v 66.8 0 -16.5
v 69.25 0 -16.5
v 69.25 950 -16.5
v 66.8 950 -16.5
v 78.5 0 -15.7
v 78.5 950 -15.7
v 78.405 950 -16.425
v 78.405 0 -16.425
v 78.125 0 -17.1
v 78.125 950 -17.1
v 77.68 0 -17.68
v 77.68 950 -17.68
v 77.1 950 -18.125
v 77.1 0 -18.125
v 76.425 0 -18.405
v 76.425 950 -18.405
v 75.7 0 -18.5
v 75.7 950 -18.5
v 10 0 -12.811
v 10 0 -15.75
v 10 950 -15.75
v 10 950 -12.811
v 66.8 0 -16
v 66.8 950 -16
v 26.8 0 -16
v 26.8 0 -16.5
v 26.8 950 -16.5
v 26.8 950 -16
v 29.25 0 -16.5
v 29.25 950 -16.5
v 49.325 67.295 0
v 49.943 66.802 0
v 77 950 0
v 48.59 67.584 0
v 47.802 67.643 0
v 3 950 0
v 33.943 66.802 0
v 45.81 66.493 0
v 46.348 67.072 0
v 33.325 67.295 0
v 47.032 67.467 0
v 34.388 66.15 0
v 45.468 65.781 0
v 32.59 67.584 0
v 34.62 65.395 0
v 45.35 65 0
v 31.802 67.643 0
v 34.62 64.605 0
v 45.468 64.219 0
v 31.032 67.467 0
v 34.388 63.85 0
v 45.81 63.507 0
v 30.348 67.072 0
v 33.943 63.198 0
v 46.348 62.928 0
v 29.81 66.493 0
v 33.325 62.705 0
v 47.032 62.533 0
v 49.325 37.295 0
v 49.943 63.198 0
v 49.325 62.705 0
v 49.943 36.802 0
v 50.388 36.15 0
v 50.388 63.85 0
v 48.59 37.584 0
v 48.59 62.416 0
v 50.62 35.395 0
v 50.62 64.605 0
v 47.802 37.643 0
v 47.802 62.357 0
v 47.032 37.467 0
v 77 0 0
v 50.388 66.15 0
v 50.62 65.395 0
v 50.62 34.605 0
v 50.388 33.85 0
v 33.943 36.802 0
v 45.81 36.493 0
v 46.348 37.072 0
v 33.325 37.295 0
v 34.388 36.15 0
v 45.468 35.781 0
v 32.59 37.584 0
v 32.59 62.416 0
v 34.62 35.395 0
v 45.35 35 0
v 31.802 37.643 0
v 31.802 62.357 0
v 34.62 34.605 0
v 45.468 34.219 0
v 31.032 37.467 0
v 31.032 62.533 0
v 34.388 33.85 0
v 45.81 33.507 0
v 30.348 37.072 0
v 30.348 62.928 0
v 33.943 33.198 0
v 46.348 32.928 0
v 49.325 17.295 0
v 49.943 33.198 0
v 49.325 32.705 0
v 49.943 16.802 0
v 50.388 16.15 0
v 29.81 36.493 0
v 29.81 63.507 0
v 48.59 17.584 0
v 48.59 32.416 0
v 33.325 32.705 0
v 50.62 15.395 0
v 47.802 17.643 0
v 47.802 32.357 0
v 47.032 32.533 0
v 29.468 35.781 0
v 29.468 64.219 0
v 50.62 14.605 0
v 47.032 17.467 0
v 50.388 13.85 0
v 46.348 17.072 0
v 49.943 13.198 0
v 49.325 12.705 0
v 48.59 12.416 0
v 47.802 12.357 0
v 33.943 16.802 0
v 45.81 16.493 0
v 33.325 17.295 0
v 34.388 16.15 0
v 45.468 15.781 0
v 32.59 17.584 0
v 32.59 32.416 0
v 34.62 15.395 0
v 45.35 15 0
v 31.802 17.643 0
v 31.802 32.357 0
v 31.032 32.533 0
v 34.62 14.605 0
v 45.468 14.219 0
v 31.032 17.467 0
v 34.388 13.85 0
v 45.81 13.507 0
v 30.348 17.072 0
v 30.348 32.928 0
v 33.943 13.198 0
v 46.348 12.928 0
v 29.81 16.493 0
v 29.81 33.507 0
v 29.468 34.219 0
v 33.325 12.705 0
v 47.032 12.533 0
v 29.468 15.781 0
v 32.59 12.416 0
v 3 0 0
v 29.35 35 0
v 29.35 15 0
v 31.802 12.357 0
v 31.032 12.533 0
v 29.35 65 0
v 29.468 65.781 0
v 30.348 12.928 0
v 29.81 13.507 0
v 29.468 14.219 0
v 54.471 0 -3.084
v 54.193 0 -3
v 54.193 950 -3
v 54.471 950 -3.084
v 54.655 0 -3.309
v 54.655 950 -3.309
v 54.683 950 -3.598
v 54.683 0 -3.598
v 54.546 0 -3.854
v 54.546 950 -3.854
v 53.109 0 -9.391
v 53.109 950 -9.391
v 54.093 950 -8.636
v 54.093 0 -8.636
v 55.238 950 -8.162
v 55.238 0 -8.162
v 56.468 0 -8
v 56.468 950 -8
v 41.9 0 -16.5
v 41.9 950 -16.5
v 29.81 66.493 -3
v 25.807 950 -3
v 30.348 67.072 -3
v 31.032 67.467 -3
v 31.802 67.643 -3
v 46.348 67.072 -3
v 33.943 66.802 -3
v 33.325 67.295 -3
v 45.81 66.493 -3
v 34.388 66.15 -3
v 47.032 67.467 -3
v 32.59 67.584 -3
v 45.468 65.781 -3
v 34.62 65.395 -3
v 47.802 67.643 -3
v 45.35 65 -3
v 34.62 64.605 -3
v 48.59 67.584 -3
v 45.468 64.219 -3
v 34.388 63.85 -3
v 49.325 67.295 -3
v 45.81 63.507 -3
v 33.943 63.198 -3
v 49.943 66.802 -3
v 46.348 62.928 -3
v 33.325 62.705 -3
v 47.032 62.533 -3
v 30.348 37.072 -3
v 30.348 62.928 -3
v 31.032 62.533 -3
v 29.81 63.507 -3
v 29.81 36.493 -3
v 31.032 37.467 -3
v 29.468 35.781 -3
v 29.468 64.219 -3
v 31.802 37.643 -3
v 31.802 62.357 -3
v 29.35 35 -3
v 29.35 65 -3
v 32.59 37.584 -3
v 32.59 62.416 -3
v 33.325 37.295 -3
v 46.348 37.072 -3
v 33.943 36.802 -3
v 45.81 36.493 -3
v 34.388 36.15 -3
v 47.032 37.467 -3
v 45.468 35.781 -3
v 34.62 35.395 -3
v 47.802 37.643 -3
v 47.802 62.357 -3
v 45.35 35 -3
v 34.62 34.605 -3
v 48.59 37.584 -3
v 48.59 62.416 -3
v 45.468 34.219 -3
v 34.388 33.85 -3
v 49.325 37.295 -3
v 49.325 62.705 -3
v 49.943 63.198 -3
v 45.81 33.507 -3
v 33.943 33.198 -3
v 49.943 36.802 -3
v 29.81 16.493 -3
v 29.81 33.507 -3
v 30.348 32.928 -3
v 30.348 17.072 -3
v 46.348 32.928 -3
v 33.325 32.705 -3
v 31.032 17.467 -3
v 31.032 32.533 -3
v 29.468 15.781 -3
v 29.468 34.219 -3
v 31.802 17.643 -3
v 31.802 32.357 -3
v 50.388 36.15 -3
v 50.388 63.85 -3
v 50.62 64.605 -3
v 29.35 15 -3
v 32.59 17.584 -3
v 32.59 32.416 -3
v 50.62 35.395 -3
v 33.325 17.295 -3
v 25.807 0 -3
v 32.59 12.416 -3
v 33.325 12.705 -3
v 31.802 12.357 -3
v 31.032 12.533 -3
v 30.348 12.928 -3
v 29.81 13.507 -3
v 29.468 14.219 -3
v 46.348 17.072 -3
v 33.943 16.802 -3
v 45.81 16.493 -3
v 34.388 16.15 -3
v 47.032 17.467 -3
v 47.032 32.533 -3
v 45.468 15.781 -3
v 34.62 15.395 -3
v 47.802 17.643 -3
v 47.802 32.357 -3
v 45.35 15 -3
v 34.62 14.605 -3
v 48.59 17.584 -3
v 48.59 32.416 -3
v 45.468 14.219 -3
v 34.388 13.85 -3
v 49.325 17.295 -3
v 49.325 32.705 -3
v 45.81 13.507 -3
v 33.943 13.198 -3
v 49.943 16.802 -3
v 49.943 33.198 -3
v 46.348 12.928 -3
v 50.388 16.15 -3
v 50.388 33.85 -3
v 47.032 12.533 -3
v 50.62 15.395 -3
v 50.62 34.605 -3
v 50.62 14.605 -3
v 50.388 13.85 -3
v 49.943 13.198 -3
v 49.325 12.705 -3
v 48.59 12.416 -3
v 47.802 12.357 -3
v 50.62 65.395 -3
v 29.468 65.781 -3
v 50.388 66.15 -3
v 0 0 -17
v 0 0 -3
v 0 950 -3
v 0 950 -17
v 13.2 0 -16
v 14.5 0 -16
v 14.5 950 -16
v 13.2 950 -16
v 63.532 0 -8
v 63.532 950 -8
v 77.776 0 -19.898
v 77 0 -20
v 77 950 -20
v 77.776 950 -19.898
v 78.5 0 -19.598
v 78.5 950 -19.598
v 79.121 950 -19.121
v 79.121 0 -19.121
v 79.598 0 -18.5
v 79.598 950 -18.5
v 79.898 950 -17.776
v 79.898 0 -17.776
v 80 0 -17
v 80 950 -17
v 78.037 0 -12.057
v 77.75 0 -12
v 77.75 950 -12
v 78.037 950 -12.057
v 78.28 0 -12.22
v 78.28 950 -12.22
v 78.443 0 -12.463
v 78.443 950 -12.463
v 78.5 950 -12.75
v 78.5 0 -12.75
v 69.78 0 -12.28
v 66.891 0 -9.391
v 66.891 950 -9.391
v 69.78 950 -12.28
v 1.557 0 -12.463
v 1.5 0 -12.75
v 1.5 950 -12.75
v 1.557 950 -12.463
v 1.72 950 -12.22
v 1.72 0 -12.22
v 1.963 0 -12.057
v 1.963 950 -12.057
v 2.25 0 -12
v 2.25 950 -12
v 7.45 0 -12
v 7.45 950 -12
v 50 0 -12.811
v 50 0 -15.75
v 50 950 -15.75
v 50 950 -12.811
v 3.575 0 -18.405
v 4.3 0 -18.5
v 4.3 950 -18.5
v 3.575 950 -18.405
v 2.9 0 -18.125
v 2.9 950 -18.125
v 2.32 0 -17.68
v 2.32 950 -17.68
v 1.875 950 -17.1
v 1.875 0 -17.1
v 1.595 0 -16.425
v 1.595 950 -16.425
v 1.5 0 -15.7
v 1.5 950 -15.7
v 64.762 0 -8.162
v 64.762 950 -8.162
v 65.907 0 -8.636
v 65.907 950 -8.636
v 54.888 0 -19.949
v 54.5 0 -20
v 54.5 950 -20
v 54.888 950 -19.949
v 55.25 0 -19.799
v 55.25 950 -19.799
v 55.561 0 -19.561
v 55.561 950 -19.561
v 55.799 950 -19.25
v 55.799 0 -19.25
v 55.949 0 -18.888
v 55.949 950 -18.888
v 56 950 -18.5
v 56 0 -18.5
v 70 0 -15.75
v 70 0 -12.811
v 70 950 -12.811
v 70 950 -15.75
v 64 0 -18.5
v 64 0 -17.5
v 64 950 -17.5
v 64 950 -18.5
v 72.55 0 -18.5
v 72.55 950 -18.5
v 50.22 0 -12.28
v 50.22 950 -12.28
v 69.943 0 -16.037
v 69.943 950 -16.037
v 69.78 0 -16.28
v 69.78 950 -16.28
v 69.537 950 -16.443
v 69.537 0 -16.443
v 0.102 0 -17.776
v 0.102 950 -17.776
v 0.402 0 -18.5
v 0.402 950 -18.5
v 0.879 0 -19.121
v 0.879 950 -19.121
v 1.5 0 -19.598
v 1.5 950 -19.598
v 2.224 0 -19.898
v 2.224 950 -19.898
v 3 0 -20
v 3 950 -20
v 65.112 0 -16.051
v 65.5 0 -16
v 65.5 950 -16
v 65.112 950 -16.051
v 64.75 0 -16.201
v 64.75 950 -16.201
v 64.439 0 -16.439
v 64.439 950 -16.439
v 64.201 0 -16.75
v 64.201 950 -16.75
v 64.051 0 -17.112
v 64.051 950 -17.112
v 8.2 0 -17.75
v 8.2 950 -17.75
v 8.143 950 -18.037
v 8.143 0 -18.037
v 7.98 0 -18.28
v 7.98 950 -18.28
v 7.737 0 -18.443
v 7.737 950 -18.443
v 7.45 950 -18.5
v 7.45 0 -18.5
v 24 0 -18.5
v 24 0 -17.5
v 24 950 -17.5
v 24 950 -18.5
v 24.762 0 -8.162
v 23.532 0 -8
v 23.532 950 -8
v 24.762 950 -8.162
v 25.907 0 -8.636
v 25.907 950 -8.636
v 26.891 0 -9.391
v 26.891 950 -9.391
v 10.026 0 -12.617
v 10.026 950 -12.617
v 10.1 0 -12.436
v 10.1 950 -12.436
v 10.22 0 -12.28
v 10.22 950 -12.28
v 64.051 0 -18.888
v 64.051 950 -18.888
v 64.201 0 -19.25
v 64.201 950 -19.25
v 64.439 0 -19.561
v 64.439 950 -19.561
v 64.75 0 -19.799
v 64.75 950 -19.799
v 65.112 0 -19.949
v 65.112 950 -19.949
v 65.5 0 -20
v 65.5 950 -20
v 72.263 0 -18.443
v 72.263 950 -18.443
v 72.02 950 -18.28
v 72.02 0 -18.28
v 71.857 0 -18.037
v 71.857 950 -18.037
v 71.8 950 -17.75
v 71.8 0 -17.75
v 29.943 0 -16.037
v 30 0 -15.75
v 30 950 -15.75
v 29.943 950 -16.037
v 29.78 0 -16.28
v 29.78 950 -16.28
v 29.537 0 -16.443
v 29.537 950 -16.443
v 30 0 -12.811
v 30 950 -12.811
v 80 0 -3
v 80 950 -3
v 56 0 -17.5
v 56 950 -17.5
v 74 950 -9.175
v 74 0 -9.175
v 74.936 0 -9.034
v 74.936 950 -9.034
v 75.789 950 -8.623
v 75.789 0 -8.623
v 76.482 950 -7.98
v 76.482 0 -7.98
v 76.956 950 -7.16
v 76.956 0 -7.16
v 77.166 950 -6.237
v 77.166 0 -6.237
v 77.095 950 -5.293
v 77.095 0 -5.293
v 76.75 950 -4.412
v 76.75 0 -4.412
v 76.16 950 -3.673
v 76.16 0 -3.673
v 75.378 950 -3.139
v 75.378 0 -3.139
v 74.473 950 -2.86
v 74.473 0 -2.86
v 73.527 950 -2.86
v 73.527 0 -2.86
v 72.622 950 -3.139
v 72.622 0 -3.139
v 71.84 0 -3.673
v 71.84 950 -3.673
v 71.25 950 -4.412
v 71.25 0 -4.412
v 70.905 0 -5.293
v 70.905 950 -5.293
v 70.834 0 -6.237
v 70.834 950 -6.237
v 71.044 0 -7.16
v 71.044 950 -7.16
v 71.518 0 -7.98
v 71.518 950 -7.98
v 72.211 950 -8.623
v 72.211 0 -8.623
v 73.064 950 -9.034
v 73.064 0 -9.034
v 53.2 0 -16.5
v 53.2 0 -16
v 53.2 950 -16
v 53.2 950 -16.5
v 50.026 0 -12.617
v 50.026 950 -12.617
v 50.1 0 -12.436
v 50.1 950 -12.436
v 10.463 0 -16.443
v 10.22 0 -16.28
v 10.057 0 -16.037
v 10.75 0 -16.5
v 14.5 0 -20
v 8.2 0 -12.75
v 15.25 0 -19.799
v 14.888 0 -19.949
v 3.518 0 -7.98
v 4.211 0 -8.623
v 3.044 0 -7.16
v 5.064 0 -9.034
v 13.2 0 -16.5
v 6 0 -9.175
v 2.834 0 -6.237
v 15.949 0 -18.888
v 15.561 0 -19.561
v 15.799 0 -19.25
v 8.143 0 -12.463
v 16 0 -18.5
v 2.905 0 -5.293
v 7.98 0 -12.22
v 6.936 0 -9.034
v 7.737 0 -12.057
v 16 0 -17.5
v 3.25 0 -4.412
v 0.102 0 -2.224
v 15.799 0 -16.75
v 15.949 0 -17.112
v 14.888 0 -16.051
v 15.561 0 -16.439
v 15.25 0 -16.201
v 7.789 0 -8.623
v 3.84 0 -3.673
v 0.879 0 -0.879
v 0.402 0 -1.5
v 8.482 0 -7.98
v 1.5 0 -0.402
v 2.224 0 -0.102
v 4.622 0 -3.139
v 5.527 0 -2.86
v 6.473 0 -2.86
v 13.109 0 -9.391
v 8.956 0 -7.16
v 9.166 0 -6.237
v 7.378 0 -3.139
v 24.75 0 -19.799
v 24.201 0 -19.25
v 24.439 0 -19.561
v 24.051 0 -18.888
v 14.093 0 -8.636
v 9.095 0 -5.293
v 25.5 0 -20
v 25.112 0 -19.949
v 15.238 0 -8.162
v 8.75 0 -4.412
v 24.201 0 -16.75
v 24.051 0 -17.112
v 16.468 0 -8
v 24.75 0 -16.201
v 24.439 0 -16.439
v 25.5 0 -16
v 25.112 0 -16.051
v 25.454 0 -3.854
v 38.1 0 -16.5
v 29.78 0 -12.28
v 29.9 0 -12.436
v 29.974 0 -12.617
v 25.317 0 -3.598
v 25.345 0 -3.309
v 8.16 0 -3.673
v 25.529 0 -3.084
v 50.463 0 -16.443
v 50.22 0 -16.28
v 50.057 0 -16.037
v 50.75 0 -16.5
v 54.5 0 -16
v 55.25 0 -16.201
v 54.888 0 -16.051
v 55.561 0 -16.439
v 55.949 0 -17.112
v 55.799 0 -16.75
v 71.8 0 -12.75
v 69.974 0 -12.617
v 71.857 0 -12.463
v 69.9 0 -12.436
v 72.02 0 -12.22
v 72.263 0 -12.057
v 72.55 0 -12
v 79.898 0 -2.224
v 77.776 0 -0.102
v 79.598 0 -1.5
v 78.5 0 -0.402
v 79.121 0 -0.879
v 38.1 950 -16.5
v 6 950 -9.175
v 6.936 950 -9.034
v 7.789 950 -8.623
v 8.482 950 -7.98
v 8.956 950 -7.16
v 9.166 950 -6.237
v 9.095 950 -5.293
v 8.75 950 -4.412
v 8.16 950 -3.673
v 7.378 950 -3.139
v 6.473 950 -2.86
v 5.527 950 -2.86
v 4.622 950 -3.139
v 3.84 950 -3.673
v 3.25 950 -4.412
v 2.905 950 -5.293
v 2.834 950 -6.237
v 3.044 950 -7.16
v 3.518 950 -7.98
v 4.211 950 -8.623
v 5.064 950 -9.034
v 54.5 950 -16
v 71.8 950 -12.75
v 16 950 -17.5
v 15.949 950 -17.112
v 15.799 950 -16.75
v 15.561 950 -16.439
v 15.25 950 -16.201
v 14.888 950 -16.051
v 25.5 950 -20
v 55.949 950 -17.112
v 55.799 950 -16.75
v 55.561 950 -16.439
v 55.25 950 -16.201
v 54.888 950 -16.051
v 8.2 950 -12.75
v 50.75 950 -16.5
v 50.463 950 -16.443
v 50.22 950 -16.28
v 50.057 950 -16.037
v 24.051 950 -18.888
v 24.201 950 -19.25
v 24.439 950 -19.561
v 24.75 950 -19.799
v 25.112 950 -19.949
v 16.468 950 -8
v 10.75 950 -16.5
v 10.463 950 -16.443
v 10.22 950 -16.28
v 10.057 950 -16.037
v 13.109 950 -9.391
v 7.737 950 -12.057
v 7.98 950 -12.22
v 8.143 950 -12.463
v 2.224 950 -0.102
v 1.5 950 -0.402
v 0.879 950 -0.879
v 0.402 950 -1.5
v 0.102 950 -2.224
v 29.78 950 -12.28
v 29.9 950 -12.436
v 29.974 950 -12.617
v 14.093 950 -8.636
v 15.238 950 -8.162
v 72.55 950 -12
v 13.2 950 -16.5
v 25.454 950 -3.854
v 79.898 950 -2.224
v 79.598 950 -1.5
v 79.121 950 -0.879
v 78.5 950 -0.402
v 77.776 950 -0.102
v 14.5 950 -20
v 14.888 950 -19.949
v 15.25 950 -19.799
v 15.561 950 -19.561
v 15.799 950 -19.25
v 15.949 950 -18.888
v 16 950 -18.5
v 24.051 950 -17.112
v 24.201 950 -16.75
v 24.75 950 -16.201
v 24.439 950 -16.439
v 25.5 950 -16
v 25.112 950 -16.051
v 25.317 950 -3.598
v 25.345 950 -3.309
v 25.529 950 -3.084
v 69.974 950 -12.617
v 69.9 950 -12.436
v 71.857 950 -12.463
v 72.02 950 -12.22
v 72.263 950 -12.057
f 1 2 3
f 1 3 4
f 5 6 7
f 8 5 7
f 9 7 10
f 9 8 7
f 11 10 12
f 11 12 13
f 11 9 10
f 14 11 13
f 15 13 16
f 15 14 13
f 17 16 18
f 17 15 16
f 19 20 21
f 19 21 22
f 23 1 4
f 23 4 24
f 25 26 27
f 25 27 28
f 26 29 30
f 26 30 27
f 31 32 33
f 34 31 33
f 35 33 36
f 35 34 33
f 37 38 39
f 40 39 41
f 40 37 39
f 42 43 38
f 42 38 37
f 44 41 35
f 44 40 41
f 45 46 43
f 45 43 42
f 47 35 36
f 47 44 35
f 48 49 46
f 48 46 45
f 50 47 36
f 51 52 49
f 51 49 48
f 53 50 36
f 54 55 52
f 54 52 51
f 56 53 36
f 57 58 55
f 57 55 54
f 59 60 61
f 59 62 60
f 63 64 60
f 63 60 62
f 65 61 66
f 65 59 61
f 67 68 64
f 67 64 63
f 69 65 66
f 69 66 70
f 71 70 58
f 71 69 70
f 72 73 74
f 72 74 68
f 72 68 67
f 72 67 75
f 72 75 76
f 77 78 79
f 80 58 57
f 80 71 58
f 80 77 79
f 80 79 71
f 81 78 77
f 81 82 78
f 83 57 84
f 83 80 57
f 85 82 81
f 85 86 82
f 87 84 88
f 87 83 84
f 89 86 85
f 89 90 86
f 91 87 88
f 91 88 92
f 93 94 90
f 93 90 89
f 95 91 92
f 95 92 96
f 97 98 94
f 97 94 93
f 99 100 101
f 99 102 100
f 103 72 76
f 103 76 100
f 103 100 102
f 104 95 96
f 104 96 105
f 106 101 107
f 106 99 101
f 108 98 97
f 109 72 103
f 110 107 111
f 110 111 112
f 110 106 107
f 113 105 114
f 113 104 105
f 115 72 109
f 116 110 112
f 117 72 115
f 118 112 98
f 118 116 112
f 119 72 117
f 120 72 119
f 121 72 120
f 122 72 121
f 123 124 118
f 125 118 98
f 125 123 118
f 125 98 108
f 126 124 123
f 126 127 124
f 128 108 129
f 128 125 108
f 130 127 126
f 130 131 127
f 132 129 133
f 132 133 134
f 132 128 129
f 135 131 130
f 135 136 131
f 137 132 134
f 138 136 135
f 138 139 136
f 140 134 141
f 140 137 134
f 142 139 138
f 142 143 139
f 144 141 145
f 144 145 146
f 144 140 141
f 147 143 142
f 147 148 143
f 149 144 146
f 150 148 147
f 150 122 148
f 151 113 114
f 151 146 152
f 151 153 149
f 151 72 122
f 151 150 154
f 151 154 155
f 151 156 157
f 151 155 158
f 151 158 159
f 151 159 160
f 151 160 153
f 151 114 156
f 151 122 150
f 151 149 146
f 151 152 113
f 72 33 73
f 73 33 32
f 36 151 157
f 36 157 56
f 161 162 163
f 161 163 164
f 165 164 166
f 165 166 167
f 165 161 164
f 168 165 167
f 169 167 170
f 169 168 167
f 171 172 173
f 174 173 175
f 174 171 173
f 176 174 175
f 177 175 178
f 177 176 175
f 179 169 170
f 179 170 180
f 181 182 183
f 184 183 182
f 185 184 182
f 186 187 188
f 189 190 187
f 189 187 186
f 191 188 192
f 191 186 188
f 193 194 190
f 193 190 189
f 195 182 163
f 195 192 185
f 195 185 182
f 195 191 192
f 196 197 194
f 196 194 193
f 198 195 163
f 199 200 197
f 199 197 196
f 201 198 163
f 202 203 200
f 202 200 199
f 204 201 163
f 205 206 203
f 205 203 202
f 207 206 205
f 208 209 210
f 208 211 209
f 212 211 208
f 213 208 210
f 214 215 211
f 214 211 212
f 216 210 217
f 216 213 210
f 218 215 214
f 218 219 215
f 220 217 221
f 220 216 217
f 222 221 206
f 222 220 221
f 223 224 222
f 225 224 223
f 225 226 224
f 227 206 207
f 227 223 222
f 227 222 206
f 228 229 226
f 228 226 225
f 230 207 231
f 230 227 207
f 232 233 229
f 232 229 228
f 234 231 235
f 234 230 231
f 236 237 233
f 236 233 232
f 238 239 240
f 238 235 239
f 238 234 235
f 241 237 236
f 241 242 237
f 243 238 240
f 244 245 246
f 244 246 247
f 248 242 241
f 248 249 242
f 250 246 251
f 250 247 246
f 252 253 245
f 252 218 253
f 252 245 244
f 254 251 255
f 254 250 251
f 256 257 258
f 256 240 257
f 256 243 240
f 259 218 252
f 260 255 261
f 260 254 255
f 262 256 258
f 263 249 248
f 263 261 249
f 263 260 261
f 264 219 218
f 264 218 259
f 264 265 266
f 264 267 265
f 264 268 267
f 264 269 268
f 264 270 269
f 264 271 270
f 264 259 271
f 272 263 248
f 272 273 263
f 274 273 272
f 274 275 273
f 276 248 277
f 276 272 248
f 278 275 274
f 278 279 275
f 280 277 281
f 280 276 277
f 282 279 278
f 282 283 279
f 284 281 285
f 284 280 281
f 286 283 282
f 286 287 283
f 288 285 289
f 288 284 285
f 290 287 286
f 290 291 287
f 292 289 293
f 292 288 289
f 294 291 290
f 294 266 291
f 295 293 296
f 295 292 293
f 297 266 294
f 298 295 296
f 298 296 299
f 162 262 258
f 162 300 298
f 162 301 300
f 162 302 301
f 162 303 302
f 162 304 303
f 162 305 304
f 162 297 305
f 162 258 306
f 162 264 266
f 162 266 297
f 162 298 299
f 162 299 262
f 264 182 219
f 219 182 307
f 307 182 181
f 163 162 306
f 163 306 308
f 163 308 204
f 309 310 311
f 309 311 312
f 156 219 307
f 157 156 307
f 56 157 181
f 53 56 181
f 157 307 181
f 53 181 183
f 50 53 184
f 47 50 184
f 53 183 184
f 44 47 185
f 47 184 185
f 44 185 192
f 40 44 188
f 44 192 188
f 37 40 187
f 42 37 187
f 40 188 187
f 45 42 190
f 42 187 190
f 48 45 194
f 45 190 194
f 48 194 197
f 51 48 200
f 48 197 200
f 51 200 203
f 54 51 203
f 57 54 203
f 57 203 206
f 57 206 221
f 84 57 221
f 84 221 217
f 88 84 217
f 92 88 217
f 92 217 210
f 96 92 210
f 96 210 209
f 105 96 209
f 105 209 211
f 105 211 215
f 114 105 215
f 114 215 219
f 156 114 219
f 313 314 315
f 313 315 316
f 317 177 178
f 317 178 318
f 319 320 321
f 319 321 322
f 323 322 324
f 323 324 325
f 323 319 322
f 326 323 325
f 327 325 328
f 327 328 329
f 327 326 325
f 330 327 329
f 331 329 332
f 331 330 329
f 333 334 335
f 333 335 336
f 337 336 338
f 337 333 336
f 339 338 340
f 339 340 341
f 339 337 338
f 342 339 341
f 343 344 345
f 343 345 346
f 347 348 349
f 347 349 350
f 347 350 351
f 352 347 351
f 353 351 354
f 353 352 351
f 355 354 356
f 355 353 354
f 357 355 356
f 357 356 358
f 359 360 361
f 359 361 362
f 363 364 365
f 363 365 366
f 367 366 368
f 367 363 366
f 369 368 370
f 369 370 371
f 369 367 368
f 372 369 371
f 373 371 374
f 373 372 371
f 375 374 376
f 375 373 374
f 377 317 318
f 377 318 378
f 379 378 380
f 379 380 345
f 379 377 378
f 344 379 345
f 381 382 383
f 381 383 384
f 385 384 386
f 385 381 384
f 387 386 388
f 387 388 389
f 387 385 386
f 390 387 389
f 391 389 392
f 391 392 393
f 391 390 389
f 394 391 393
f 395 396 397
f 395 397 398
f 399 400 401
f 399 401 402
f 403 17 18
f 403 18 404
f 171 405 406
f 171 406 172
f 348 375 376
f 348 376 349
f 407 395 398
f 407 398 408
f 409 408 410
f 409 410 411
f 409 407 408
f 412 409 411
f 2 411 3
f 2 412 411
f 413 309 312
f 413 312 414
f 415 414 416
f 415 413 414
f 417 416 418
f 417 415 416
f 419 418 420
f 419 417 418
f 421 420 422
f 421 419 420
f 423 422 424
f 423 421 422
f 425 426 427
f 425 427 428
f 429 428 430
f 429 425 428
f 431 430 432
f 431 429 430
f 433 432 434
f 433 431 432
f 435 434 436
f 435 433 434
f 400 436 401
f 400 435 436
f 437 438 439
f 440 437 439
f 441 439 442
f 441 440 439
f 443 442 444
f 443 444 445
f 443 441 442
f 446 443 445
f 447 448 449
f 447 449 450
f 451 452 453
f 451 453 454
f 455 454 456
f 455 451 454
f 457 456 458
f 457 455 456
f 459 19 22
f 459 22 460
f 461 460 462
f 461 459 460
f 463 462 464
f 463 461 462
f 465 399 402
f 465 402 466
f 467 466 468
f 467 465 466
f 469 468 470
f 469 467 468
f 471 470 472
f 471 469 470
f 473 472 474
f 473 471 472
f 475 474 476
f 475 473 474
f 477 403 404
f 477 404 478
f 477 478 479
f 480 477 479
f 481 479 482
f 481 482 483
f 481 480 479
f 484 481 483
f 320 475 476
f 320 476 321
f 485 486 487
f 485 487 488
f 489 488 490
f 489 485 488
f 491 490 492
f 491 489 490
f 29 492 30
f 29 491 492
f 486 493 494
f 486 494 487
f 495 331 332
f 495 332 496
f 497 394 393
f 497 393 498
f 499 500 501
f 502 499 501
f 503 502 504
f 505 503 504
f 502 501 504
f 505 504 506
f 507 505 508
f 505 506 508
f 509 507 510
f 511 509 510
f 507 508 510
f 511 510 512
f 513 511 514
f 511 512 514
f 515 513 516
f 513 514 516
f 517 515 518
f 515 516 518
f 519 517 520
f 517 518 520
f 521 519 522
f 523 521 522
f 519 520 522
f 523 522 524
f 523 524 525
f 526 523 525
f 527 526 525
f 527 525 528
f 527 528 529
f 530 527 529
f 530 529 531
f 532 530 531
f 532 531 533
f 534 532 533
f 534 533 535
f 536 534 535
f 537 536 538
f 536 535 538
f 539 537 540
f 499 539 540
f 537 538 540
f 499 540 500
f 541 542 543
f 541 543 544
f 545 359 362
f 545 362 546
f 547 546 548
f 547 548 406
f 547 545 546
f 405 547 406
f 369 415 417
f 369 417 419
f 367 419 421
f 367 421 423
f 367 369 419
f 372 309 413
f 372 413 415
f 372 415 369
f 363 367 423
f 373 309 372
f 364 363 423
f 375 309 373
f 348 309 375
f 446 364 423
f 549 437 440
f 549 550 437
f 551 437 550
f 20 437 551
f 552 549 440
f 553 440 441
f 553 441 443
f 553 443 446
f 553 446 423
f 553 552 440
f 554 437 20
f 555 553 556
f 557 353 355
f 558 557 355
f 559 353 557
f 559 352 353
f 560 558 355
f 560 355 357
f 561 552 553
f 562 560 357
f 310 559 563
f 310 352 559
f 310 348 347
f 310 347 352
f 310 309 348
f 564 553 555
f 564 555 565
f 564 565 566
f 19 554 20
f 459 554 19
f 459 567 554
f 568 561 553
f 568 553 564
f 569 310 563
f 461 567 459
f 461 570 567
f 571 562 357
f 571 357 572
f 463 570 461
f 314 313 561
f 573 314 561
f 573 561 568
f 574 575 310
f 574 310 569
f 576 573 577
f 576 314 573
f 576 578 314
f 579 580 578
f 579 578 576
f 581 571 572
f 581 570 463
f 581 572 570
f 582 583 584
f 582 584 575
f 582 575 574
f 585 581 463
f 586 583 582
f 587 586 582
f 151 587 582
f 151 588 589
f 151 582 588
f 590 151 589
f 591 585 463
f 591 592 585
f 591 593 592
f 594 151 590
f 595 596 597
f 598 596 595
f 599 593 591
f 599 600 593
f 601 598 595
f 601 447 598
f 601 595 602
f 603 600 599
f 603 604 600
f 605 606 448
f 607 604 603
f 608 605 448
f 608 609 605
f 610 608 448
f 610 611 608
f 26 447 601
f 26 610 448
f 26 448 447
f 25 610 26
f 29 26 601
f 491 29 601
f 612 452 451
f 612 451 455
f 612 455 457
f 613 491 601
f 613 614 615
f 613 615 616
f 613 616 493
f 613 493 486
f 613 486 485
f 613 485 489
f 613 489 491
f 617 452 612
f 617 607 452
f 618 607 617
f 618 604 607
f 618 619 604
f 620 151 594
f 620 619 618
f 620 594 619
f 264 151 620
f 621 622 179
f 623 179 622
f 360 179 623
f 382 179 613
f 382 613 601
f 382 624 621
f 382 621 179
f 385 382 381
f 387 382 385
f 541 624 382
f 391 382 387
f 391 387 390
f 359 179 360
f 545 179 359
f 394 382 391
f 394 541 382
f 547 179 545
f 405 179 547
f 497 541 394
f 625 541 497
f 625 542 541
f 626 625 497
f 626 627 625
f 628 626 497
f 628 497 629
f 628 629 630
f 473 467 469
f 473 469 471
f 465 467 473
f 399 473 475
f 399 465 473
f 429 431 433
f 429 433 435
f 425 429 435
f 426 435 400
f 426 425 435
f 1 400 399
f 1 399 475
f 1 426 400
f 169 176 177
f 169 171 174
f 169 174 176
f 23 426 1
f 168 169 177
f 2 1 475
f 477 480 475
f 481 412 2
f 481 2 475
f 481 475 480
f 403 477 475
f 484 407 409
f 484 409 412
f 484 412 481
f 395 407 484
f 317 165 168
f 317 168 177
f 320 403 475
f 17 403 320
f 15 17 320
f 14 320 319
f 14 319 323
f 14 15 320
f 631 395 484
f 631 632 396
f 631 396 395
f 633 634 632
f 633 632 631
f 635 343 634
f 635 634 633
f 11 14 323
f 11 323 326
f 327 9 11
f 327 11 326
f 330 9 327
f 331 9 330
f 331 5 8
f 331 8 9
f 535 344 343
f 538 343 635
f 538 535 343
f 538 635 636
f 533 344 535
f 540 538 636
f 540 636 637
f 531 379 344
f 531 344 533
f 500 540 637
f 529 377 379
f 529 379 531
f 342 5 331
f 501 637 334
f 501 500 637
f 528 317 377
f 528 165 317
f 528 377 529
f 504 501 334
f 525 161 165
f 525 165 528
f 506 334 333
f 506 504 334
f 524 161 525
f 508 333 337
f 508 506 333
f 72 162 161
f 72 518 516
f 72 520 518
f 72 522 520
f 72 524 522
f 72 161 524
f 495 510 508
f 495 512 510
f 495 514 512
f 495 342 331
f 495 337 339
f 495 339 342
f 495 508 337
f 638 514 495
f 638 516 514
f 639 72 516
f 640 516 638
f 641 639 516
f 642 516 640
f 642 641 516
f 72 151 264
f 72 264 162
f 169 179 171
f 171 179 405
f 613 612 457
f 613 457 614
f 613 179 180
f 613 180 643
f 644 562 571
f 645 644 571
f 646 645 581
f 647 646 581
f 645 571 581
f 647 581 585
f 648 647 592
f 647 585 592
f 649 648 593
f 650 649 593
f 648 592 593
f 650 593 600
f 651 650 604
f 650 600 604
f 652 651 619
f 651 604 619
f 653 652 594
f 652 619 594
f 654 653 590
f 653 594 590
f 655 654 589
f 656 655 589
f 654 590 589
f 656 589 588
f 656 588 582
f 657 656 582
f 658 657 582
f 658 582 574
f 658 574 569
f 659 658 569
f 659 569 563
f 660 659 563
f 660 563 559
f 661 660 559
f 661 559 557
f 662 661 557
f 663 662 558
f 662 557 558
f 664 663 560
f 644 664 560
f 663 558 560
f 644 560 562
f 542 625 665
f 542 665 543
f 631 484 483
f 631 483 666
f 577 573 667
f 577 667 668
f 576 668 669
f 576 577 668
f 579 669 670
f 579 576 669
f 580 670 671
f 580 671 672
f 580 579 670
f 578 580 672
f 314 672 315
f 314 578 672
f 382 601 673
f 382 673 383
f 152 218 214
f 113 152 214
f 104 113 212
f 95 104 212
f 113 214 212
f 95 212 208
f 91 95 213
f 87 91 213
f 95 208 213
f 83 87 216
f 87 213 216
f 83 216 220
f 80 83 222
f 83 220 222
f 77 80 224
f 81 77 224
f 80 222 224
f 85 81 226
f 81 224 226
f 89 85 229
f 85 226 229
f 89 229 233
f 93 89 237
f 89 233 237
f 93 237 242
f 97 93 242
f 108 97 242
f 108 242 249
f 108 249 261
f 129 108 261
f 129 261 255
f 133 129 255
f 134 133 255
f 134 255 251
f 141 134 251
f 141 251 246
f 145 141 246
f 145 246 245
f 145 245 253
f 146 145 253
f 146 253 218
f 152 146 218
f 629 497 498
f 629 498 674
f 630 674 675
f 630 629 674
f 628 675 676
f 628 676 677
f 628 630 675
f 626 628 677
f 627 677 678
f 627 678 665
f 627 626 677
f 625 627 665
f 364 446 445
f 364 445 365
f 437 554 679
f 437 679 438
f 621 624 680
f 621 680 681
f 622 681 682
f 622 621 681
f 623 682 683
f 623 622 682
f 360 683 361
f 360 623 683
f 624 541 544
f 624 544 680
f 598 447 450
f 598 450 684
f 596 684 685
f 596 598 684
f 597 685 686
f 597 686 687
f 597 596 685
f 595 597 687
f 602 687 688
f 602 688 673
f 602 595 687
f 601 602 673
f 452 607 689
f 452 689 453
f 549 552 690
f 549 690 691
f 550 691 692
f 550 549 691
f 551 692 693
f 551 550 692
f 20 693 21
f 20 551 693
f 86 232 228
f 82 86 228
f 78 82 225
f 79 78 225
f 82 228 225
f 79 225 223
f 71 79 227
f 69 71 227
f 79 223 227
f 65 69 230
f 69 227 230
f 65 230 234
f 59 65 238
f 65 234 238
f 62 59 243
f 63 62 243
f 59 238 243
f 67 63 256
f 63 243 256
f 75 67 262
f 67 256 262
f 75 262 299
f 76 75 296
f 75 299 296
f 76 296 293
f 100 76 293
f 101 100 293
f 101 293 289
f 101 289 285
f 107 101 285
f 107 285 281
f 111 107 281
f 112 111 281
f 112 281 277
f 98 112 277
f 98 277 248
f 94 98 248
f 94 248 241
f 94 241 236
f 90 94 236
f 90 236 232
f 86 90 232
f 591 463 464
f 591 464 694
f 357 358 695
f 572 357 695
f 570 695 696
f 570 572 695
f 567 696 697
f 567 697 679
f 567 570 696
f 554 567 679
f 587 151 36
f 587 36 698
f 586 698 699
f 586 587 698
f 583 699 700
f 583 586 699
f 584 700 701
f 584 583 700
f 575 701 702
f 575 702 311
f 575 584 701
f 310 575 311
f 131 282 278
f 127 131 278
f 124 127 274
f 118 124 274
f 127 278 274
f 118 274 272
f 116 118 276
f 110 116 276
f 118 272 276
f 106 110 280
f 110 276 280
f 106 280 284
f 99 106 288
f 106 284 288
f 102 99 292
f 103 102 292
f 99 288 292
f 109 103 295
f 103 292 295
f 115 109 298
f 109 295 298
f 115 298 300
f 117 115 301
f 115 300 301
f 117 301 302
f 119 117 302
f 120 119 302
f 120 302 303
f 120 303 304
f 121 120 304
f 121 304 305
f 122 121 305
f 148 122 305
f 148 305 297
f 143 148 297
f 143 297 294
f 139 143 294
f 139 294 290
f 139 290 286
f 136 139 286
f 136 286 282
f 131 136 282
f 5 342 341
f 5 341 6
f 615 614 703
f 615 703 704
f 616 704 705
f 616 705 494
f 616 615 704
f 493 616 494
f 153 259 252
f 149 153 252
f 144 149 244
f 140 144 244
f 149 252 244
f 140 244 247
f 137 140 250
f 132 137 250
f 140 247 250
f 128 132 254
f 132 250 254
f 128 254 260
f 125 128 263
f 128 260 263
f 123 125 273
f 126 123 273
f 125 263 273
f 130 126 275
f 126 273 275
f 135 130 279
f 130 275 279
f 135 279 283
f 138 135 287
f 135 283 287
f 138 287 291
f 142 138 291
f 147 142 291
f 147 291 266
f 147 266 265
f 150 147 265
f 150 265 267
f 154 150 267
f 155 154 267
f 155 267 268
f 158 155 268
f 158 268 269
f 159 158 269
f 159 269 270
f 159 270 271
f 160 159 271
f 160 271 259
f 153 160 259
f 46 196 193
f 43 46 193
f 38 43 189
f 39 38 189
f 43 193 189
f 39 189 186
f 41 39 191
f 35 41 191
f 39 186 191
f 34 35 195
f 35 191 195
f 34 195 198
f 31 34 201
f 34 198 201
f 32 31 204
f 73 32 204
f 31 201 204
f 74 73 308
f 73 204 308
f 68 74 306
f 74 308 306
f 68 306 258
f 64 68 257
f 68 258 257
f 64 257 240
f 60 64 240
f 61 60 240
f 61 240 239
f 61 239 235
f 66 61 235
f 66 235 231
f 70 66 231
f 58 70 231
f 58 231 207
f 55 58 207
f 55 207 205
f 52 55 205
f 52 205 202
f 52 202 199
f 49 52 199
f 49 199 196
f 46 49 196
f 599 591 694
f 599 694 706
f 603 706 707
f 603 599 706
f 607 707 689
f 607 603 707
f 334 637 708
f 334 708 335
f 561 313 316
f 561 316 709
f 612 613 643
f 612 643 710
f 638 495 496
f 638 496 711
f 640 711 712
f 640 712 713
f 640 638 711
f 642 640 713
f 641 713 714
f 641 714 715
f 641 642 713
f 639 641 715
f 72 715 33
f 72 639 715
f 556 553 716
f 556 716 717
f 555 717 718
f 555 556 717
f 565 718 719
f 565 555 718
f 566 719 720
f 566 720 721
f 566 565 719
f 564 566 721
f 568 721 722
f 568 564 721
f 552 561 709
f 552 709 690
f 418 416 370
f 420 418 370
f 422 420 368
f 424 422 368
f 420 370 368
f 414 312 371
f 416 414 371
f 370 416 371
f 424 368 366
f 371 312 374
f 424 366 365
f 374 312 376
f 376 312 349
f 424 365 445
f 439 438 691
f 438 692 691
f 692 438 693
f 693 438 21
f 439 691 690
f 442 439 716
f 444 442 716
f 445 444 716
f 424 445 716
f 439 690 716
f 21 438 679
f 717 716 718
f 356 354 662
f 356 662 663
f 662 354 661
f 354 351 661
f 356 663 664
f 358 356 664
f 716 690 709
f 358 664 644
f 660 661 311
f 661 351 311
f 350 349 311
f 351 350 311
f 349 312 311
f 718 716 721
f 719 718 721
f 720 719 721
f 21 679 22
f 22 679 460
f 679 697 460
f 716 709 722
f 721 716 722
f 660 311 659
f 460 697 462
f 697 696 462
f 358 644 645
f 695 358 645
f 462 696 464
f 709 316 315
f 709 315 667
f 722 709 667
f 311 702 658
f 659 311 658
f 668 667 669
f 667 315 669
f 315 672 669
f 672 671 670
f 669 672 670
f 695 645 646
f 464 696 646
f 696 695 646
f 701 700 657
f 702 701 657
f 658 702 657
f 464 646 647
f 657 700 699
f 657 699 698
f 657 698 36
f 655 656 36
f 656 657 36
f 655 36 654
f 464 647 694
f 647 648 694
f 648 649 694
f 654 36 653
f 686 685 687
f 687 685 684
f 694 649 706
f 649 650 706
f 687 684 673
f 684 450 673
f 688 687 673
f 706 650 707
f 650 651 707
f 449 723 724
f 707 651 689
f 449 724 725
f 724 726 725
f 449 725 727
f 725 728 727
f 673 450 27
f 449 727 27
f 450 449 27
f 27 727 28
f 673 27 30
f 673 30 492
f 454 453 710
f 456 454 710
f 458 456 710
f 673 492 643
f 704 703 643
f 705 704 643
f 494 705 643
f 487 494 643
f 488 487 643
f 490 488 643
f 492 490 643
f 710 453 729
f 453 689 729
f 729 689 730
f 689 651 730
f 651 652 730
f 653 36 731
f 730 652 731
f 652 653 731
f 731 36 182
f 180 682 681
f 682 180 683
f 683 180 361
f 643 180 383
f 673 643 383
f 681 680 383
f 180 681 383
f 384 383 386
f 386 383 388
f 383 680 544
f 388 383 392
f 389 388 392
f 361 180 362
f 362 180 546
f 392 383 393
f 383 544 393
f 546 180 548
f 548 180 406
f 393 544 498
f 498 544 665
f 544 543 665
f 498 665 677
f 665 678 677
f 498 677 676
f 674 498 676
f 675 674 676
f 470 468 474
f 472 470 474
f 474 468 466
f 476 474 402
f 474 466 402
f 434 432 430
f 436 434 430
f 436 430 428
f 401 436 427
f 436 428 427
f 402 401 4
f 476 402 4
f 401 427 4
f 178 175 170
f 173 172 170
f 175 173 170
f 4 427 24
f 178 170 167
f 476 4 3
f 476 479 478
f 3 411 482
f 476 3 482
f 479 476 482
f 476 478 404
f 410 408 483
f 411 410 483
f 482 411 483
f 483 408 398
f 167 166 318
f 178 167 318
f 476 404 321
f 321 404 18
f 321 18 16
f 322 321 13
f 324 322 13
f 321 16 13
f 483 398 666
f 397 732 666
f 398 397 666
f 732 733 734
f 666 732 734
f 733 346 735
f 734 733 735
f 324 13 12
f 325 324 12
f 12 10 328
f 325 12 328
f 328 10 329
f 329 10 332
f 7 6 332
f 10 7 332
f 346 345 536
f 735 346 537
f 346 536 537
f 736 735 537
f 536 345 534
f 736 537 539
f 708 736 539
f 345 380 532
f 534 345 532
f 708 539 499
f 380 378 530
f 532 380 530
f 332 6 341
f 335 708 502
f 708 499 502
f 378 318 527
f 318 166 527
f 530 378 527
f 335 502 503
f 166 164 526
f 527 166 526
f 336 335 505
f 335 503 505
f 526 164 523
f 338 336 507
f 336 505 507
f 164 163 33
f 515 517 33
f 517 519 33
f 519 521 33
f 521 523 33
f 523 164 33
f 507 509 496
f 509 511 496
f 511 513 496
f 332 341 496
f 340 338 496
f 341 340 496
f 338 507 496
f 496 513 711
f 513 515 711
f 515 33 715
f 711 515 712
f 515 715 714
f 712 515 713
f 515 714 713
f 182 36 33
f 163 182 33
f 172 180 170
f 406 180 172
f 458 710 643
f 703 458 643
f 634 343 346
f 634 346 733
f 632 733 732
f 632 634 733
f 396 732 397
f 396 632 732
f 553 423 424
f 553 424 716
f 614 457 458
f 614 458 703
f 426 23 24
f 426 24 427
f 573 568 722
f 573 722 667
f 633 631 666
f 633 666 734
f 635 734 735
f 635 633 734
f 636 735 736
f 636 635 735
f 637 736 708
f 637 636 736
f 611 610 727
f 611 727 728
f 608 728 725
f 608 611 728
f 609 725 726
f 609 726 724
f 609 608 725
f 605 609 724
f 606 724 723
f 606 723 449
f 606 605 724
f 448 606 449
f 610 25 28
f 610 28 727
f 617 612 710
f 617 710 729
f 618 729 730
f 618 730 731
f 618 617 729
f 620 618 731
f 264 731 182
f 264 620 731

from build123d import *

# Parameters (mm, degrees)
SKETCH1_R                = 3.175
BOSS_EXTRUDE1_DEPTH      = 950
M5_CLEARANCE_HOLE1_D     = 5.3
M5_CLEARANCE_HOLE1_DEPTH = 5
M5_CLEARANCE_HOLE1_TIP   = 1.59228064


with BuildPart() as part:
    # Sketch1 → Boss-Extrude1 (new body)
    with BuildSketch(Plane.XZ):
        with BuildLine():
            Line((77, 0), (3, 0))
            ThreePointArc((3, 0), (0.878679656, -0.878679656), (0, -3))
            Line((0, -3), (0, -17))
            ThreePointArc((0, -17), (0.878679656, -19.121320344), (3, -20))
            Line((3, -20), (14.5, -20))
            ThreePointArc((14.5, -20), (15.560660172, -19.560660172), (16, -18.5))
            Line((16, -18.5), (16, -17.5))
            ThreePointArc((16, -17.5), (15.560660172, -16.439339828), (14.5, -16))
            Line((14.5, -16), (13.2, -16))
            Line((13.2, -16), (13.2, -16.5))
            Line((13.2, -16.5), (10.75, -16.5))
            ThreePointArc((10.75, -16.5), (10.219669914, -16.280330086), (10, -15.75))
            Line((10, -15.75), (10, -12.810660172))
            ThreePointArc((10, -12.810660172), (10.057090351, -12.523647598), (10.219669914, -12.280330086))
            Line((10.219669914, -12.280330086), (13.108757211, -9.391242789))
            ThreePointArc((13.108757211, -9.391242789), (14.649768118, -8.361572221), (16.467514421, -8))
            Line((16.467514421, -8), (23.532485579, -8))
            ThreePointArc((23.532485579, -8), (25.350231882, -8.361572221), (26.891242789, -9.391242789))
            Line((26.891242789, -9.391242789), (29.780330086, -12.280330086))
            ThreePointArc((29.780330086, -12.280330086), (29.942909649, -12.523647598), (30, -12.810660172))
            Line((30, -12.810660172), (30, -15.75))
            ThreePointArc((30, -15.75), (29.780330086, -16.280330086), (29.25, -16.5))
            Line((29.25, -16.5), (26.8, -16.5))
            Line((26.8, -16.5), (26.8, -16))
            Line((26.8, -16), (25.5, -16))
            ThreePointArc((25.5, -16), (24.439339828, -16.439339828), (24, -17.5))
            Line((24, -17.5), (24, -18.5))
            ThreePointArc((24, -18.5), (24.439339828, -19.560660172), (25.5, -20))
            Line((25.5, -20), (54.5, -20))
            ThreePointArc((54.5, -20), (55.560660172, -19.560660172), (56, -18.5))
            Line((56, -18.5), (56, -17.5))
            ThreePointArc((56, -17.5), (55.560660172, -16.439339828), (54.5, -16))
            Line((54.5, -16), (53.2, -16))
            Line((53.2, -16), (53.2, -16.5))
            Line((53.2, -16.5), (50.75, -16.5))
            ThreePointArc((50.75, -16.5), (50.219669914, -16.280330086), (50, -15.75))
            Line((50, -15.75), (50, -12.810660172))
            ThreePointArc((50, -12.810660172), (50.057090351, -12.523647598), (50.219669914, -12.280330086))
            Line((50.219669914, -12.280330086), (53.108757211, -9.391242789))
            ThreePointArc((53.108757211, -9.391242789), (54.649768118, -8.361572221), (56.467514421, -8))
            Line((56.467514421, -8), (63.532485579, -8))
            ThreePointArc((63.532485579, -8), (65.350231882, -8.361572221), (66.891242789, -9.391242789))
            Line((66.891242789, -9.391242789), (69.780330086, -12.280330086))
            ThreePointArc((69.780330086, -12.280330086), (69.942909649, -12.523647598), (70, -12.810660172))
            Line((70, -12.810660172), (70, -15.75))
            ThreePointArc((70, -15.75), (69.780330086, -16.280330086), (69.25, -16.5))
            Line((69.25, -16.5), (66.8, -16.5))
            Line((66.8, -16.5), (66.8, -16))
            Line((66.8, -16), (65.5, -16))
            ThreePointArc((65.5, -16), (64.439339828, -16.439339828), (64, -17.5))
            Line((64, -17.5), (64, -18.5))
            ThreePointArc((64, -18.5), (64.439339828, -19.560660172), (65.5, -20))
            Line((65.5, -20), (77, -20))
            ThreePointArc((77, -20), (79.121320344, -19.121320344), (80, -17))
            Line((80, -17), (80, -3))
            ThreePointArc((80, -3), (79.121320344, -0.878679656), (77, 0))
        make_face()
        with Locations(Location((6, -6, 0), (0, 0, 270))):
            Circle(SKETCH1_R, mode=Mode.SUBTRACT)
        with Locations(Location((74, -6, 0), (0, 0, 270))):
            Circle(SKETCH1_R, mode=Mode.SUBTRACT)
        with BuildLine():
            Line((7.45, -18.5), (4.3, -18.5))
            ThreePointArc((4.3, -18.5), (2.320101013, -17.679898987), (1.5, -15.7))
            Line((1.5, -15.7), (1.5, -12.75))
            ThreePointArc((1.5, -12.75), (1.719669914, -12.219669914), (2.25, -12))
            Line((2.25, -12), (7.45, -12))
            ThreePointArc((7.45, -12), (7.980330086, -12.219669914), (8.2, -12.75))
            Line((8.2, -12.75), (8.2, -17.75))
            ThreePointArc((8.2, -17.75), (7.980330086, -18.280330086), (7.45, -18.5))
        make_face(mode=Mode.SUBTRACT)
        with BuildLine():
            Line((54.546446609, -3.853553391), (41.9, -16.5))
            Line((41.9, -16.5), (38.1, -16.5))
            Line((38.1, -16.5), (25.453553391, -3.853553391))
            ThreePointArc((25.453553391, -3.853553391), (25.345167015, -3.308658284), (25.807106781, -3))
            Line((25.807106781, -3), (54.192893219, -3))
            ThreePointArc((54.192893219, -3), (54.654832985, -3.308658284), (54.546446609, -3.853553391))
        make_face(mode=Mode.SUBTRACT)
        with BuildLine():
            Line((71.8, -17.75), (71.8, -12.75))
            ThreePointArc((71.8, -12.75), (72.019669914, -12.219669914), (72.55, -12))
            Line((72.55, -12), (77.75, -12))
            ThreePointArc((77.75, -12), (78.280330086, -12.219669914), (78.5, -12.75))
            Line((78.5, -12.75), (78.5, -15.7))
            ThreePointArc((78.5, -15.7), (77.679898987, -17.679898987), (75.7, -18.5))
            Line((75.7, -18.5), (72.55, -18.5))
            ThreePointArc((72.55, -18.5), (72.019669914, -18.280330086), (71.8, -17.75))
        make_face(mode=Mode.SUBTRACT)
    extrude(amount=-BOSS_EXTRUDE1_DEPTH)

    # M5 Clearance Hole1
    with Locations(Plane.XY):
        with Locations((48, 15), (48, 35), (48, 65), (32, 65), (32, 35), (32, 15)):
            Hole(M5_CLEARANCE_HOLE1_D / 2, depth=M5_CLEARANCE_HOLE1_DEPTH)
            with Locations((0, 0, -(M5_CLEARANCE_HOLE1_DEPTH + M5_CLEARANCE_HOLE1_TIP / 2))):  # 118° drill point
                Cone(0, M5_CLEARANCE_HOLE1_D / 2, M5_CLEARANCE_HOLE1_TIP, mode=Mode.SUBTRACT)


solid = part.part
